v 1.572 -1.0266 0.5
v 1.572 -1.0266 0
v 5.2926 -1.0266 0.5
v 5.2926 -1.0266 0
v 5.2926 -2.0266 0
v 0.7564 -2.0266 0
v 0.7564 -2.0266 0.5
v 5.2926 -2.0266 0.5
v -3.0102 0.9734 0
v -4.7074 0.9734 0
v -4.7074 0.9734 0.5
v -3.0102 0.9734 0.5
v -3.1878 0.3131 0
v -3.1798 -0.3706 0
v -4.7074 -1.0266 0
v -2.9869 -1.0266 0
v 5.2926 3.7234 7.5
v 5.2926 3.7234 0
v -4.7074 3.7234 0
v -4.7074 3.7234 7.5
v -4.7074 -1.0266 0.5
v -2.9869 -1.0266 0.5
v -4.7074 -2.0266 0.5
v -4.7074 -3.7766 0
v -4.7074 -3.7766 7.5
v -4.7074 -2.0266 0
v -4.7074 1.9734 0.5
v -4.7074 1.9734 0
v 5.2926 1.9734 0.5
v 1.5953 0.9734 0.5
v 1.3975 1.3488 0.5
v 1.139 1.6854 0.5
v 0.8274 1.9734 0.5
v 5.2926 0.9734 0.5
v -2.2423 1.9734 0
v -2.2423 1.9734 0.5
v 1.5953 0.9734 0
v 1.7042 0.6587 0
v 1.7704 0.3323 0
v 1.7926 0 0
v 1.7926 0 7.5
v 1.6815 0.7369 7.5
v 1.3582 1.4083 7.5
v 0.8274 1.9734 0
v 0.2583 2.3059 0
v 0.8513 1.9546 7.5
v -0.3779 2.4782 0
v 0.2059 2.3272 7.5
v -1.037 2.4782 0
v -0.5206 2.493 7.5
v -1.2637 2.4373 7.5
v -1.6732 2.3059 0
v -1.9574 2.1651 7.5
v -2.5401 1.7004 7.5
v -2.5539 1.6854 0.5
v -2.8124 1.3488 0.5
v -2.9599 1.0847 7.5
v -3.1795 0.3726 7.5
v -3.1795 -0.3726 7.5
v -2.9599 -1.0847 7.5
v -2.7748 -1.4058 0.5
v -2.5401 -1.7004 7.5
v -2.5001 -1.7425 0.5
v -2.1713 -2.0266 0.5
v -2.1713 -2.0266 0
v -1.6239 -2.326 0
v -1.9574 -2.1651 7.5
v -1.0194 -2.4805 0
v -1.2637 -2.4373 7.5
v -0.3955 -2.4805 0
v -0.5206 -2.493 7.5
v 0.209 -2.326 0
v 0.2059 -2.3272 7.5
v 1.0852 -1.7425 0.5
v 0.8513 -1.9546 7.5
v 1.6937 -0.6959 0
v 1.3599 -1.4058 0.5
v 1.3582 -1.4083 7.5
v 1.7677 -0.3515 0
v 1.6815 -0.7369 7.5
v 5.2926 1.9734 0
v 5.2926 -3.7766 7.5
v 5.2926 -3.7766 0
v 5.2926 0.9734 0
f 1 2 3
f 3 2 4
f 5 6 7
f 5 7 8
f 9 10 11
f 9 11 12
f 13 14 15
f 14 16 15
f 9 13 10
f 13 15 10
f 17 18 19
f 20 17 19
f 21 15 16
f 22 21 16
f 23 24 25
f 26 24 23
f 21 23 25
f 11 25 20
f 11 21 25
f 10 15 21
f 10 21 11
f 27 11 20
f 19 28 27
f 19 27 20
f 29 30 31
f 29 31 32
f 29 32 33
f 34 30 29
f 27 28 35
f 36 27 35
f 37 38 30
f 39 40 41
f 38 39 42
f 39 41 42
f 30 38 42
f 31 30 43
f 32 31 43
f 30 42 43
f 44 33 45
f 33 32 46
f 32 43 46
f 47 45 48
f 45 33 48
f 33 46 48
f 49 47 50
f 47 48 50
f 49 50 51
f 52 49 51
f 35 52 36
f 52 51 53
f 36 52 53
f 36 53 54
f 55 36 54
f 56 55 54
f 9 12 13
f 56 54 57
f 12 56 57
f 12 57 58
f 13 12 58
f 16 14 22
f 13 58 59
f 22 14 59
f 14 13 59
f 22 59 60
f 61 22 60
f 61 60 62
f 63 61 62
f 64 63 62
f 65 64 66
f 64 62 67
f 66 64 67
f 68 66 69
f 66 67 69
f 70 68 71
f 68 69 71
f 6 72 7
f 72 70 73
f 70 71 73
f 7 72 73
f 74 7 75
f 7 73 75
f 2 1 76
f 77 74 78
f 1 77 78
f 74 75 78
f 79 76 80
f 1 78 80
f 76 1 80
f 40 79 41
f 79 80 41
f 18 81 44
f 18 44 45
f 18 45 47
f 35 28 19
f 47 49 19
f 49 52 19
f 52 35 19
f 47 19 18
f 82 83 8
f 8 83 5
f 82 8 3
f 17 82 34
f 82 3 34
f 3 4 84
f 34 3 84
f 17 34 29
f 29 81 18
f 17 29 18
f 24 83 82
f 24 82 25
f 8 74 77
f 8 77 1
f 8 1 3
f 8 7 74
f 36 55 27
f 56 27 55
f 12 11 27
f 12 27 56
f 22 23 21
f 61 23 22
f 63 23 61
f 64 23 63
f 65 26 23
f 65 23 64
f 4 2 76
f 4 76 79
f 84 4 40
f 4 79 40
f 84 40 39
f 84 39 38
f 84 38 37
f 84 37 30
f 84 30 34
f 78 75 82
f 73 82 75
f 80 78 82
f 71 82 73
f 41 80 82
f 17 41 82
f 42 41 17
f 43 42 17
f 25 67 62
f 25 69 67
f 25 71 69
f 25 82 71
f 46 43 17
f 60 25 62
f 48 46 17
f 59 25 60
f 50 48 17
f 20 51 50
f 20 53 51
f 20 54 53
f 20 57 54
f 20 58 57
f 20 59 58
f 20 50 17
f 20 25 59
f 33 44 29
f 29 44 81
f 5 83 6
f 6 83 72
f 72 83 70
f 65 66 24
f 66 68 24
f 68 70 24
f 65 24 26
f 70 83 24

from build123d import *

# Parameters (mm, degrees)
SKETCH1_W           = 7.5
SKETCH1_H           = 10
BOSS_EXTRUDE1_DEPTH = 7.5
SKETCH2_R           = 2.5
CUT_EXTRUDE1_DEPTH  = 7.5
SKETCH3_W           = 10
SKETCH3_H           = 1
CUT_EXTRUDE2_DEPTH  = 0.5


with BuildPart() as part:
    # Sketch1 → Boss-Extrude1 (new body)
    with BuildSketch(Plane(origin=(0, 0, 0), x_dir=(0, 1, 0), z_dir=(0, 0, 1))):
        with Locations((-0.026595745, -0.292553191)):
            Rectangle(SKETCH1_W, SKETCH1_H)
    extrude(amount=BOSS_EXTRUDE1_DEPTH)

    # Sketch2 → Cut-Extrude1 (cut)
    with BuildSketch(Plane.XY.offset(7.5)):
        with Locations((-0.707446809, 0)):
            Circle(SKETCH2_R)
    extrude(amount=-CUT_EXTRUDE1_DEPTH, mode=Mode.SUBTRACT)

    # Sketch3 → Cut-Extrude2 (cut)
    with BuildSketch(Plane(origin=(0, 0, 0), x_dir=(1, 0, 0), z_dir=(0, 0, -1))):
        with Locations((0.292553191, 1.526595745)):
            Rectangle(SKETCH3_W, SKETCH3_H)
        with Locations((0.292553191, -1.473404255)):
            Rectangle(SKETCH3_W, SKETCH3_H)
    extrude(amount=-CUT_EXTRUDE2_DEPTH, mode=Mode.SUBTRACT)


solid = part.part
